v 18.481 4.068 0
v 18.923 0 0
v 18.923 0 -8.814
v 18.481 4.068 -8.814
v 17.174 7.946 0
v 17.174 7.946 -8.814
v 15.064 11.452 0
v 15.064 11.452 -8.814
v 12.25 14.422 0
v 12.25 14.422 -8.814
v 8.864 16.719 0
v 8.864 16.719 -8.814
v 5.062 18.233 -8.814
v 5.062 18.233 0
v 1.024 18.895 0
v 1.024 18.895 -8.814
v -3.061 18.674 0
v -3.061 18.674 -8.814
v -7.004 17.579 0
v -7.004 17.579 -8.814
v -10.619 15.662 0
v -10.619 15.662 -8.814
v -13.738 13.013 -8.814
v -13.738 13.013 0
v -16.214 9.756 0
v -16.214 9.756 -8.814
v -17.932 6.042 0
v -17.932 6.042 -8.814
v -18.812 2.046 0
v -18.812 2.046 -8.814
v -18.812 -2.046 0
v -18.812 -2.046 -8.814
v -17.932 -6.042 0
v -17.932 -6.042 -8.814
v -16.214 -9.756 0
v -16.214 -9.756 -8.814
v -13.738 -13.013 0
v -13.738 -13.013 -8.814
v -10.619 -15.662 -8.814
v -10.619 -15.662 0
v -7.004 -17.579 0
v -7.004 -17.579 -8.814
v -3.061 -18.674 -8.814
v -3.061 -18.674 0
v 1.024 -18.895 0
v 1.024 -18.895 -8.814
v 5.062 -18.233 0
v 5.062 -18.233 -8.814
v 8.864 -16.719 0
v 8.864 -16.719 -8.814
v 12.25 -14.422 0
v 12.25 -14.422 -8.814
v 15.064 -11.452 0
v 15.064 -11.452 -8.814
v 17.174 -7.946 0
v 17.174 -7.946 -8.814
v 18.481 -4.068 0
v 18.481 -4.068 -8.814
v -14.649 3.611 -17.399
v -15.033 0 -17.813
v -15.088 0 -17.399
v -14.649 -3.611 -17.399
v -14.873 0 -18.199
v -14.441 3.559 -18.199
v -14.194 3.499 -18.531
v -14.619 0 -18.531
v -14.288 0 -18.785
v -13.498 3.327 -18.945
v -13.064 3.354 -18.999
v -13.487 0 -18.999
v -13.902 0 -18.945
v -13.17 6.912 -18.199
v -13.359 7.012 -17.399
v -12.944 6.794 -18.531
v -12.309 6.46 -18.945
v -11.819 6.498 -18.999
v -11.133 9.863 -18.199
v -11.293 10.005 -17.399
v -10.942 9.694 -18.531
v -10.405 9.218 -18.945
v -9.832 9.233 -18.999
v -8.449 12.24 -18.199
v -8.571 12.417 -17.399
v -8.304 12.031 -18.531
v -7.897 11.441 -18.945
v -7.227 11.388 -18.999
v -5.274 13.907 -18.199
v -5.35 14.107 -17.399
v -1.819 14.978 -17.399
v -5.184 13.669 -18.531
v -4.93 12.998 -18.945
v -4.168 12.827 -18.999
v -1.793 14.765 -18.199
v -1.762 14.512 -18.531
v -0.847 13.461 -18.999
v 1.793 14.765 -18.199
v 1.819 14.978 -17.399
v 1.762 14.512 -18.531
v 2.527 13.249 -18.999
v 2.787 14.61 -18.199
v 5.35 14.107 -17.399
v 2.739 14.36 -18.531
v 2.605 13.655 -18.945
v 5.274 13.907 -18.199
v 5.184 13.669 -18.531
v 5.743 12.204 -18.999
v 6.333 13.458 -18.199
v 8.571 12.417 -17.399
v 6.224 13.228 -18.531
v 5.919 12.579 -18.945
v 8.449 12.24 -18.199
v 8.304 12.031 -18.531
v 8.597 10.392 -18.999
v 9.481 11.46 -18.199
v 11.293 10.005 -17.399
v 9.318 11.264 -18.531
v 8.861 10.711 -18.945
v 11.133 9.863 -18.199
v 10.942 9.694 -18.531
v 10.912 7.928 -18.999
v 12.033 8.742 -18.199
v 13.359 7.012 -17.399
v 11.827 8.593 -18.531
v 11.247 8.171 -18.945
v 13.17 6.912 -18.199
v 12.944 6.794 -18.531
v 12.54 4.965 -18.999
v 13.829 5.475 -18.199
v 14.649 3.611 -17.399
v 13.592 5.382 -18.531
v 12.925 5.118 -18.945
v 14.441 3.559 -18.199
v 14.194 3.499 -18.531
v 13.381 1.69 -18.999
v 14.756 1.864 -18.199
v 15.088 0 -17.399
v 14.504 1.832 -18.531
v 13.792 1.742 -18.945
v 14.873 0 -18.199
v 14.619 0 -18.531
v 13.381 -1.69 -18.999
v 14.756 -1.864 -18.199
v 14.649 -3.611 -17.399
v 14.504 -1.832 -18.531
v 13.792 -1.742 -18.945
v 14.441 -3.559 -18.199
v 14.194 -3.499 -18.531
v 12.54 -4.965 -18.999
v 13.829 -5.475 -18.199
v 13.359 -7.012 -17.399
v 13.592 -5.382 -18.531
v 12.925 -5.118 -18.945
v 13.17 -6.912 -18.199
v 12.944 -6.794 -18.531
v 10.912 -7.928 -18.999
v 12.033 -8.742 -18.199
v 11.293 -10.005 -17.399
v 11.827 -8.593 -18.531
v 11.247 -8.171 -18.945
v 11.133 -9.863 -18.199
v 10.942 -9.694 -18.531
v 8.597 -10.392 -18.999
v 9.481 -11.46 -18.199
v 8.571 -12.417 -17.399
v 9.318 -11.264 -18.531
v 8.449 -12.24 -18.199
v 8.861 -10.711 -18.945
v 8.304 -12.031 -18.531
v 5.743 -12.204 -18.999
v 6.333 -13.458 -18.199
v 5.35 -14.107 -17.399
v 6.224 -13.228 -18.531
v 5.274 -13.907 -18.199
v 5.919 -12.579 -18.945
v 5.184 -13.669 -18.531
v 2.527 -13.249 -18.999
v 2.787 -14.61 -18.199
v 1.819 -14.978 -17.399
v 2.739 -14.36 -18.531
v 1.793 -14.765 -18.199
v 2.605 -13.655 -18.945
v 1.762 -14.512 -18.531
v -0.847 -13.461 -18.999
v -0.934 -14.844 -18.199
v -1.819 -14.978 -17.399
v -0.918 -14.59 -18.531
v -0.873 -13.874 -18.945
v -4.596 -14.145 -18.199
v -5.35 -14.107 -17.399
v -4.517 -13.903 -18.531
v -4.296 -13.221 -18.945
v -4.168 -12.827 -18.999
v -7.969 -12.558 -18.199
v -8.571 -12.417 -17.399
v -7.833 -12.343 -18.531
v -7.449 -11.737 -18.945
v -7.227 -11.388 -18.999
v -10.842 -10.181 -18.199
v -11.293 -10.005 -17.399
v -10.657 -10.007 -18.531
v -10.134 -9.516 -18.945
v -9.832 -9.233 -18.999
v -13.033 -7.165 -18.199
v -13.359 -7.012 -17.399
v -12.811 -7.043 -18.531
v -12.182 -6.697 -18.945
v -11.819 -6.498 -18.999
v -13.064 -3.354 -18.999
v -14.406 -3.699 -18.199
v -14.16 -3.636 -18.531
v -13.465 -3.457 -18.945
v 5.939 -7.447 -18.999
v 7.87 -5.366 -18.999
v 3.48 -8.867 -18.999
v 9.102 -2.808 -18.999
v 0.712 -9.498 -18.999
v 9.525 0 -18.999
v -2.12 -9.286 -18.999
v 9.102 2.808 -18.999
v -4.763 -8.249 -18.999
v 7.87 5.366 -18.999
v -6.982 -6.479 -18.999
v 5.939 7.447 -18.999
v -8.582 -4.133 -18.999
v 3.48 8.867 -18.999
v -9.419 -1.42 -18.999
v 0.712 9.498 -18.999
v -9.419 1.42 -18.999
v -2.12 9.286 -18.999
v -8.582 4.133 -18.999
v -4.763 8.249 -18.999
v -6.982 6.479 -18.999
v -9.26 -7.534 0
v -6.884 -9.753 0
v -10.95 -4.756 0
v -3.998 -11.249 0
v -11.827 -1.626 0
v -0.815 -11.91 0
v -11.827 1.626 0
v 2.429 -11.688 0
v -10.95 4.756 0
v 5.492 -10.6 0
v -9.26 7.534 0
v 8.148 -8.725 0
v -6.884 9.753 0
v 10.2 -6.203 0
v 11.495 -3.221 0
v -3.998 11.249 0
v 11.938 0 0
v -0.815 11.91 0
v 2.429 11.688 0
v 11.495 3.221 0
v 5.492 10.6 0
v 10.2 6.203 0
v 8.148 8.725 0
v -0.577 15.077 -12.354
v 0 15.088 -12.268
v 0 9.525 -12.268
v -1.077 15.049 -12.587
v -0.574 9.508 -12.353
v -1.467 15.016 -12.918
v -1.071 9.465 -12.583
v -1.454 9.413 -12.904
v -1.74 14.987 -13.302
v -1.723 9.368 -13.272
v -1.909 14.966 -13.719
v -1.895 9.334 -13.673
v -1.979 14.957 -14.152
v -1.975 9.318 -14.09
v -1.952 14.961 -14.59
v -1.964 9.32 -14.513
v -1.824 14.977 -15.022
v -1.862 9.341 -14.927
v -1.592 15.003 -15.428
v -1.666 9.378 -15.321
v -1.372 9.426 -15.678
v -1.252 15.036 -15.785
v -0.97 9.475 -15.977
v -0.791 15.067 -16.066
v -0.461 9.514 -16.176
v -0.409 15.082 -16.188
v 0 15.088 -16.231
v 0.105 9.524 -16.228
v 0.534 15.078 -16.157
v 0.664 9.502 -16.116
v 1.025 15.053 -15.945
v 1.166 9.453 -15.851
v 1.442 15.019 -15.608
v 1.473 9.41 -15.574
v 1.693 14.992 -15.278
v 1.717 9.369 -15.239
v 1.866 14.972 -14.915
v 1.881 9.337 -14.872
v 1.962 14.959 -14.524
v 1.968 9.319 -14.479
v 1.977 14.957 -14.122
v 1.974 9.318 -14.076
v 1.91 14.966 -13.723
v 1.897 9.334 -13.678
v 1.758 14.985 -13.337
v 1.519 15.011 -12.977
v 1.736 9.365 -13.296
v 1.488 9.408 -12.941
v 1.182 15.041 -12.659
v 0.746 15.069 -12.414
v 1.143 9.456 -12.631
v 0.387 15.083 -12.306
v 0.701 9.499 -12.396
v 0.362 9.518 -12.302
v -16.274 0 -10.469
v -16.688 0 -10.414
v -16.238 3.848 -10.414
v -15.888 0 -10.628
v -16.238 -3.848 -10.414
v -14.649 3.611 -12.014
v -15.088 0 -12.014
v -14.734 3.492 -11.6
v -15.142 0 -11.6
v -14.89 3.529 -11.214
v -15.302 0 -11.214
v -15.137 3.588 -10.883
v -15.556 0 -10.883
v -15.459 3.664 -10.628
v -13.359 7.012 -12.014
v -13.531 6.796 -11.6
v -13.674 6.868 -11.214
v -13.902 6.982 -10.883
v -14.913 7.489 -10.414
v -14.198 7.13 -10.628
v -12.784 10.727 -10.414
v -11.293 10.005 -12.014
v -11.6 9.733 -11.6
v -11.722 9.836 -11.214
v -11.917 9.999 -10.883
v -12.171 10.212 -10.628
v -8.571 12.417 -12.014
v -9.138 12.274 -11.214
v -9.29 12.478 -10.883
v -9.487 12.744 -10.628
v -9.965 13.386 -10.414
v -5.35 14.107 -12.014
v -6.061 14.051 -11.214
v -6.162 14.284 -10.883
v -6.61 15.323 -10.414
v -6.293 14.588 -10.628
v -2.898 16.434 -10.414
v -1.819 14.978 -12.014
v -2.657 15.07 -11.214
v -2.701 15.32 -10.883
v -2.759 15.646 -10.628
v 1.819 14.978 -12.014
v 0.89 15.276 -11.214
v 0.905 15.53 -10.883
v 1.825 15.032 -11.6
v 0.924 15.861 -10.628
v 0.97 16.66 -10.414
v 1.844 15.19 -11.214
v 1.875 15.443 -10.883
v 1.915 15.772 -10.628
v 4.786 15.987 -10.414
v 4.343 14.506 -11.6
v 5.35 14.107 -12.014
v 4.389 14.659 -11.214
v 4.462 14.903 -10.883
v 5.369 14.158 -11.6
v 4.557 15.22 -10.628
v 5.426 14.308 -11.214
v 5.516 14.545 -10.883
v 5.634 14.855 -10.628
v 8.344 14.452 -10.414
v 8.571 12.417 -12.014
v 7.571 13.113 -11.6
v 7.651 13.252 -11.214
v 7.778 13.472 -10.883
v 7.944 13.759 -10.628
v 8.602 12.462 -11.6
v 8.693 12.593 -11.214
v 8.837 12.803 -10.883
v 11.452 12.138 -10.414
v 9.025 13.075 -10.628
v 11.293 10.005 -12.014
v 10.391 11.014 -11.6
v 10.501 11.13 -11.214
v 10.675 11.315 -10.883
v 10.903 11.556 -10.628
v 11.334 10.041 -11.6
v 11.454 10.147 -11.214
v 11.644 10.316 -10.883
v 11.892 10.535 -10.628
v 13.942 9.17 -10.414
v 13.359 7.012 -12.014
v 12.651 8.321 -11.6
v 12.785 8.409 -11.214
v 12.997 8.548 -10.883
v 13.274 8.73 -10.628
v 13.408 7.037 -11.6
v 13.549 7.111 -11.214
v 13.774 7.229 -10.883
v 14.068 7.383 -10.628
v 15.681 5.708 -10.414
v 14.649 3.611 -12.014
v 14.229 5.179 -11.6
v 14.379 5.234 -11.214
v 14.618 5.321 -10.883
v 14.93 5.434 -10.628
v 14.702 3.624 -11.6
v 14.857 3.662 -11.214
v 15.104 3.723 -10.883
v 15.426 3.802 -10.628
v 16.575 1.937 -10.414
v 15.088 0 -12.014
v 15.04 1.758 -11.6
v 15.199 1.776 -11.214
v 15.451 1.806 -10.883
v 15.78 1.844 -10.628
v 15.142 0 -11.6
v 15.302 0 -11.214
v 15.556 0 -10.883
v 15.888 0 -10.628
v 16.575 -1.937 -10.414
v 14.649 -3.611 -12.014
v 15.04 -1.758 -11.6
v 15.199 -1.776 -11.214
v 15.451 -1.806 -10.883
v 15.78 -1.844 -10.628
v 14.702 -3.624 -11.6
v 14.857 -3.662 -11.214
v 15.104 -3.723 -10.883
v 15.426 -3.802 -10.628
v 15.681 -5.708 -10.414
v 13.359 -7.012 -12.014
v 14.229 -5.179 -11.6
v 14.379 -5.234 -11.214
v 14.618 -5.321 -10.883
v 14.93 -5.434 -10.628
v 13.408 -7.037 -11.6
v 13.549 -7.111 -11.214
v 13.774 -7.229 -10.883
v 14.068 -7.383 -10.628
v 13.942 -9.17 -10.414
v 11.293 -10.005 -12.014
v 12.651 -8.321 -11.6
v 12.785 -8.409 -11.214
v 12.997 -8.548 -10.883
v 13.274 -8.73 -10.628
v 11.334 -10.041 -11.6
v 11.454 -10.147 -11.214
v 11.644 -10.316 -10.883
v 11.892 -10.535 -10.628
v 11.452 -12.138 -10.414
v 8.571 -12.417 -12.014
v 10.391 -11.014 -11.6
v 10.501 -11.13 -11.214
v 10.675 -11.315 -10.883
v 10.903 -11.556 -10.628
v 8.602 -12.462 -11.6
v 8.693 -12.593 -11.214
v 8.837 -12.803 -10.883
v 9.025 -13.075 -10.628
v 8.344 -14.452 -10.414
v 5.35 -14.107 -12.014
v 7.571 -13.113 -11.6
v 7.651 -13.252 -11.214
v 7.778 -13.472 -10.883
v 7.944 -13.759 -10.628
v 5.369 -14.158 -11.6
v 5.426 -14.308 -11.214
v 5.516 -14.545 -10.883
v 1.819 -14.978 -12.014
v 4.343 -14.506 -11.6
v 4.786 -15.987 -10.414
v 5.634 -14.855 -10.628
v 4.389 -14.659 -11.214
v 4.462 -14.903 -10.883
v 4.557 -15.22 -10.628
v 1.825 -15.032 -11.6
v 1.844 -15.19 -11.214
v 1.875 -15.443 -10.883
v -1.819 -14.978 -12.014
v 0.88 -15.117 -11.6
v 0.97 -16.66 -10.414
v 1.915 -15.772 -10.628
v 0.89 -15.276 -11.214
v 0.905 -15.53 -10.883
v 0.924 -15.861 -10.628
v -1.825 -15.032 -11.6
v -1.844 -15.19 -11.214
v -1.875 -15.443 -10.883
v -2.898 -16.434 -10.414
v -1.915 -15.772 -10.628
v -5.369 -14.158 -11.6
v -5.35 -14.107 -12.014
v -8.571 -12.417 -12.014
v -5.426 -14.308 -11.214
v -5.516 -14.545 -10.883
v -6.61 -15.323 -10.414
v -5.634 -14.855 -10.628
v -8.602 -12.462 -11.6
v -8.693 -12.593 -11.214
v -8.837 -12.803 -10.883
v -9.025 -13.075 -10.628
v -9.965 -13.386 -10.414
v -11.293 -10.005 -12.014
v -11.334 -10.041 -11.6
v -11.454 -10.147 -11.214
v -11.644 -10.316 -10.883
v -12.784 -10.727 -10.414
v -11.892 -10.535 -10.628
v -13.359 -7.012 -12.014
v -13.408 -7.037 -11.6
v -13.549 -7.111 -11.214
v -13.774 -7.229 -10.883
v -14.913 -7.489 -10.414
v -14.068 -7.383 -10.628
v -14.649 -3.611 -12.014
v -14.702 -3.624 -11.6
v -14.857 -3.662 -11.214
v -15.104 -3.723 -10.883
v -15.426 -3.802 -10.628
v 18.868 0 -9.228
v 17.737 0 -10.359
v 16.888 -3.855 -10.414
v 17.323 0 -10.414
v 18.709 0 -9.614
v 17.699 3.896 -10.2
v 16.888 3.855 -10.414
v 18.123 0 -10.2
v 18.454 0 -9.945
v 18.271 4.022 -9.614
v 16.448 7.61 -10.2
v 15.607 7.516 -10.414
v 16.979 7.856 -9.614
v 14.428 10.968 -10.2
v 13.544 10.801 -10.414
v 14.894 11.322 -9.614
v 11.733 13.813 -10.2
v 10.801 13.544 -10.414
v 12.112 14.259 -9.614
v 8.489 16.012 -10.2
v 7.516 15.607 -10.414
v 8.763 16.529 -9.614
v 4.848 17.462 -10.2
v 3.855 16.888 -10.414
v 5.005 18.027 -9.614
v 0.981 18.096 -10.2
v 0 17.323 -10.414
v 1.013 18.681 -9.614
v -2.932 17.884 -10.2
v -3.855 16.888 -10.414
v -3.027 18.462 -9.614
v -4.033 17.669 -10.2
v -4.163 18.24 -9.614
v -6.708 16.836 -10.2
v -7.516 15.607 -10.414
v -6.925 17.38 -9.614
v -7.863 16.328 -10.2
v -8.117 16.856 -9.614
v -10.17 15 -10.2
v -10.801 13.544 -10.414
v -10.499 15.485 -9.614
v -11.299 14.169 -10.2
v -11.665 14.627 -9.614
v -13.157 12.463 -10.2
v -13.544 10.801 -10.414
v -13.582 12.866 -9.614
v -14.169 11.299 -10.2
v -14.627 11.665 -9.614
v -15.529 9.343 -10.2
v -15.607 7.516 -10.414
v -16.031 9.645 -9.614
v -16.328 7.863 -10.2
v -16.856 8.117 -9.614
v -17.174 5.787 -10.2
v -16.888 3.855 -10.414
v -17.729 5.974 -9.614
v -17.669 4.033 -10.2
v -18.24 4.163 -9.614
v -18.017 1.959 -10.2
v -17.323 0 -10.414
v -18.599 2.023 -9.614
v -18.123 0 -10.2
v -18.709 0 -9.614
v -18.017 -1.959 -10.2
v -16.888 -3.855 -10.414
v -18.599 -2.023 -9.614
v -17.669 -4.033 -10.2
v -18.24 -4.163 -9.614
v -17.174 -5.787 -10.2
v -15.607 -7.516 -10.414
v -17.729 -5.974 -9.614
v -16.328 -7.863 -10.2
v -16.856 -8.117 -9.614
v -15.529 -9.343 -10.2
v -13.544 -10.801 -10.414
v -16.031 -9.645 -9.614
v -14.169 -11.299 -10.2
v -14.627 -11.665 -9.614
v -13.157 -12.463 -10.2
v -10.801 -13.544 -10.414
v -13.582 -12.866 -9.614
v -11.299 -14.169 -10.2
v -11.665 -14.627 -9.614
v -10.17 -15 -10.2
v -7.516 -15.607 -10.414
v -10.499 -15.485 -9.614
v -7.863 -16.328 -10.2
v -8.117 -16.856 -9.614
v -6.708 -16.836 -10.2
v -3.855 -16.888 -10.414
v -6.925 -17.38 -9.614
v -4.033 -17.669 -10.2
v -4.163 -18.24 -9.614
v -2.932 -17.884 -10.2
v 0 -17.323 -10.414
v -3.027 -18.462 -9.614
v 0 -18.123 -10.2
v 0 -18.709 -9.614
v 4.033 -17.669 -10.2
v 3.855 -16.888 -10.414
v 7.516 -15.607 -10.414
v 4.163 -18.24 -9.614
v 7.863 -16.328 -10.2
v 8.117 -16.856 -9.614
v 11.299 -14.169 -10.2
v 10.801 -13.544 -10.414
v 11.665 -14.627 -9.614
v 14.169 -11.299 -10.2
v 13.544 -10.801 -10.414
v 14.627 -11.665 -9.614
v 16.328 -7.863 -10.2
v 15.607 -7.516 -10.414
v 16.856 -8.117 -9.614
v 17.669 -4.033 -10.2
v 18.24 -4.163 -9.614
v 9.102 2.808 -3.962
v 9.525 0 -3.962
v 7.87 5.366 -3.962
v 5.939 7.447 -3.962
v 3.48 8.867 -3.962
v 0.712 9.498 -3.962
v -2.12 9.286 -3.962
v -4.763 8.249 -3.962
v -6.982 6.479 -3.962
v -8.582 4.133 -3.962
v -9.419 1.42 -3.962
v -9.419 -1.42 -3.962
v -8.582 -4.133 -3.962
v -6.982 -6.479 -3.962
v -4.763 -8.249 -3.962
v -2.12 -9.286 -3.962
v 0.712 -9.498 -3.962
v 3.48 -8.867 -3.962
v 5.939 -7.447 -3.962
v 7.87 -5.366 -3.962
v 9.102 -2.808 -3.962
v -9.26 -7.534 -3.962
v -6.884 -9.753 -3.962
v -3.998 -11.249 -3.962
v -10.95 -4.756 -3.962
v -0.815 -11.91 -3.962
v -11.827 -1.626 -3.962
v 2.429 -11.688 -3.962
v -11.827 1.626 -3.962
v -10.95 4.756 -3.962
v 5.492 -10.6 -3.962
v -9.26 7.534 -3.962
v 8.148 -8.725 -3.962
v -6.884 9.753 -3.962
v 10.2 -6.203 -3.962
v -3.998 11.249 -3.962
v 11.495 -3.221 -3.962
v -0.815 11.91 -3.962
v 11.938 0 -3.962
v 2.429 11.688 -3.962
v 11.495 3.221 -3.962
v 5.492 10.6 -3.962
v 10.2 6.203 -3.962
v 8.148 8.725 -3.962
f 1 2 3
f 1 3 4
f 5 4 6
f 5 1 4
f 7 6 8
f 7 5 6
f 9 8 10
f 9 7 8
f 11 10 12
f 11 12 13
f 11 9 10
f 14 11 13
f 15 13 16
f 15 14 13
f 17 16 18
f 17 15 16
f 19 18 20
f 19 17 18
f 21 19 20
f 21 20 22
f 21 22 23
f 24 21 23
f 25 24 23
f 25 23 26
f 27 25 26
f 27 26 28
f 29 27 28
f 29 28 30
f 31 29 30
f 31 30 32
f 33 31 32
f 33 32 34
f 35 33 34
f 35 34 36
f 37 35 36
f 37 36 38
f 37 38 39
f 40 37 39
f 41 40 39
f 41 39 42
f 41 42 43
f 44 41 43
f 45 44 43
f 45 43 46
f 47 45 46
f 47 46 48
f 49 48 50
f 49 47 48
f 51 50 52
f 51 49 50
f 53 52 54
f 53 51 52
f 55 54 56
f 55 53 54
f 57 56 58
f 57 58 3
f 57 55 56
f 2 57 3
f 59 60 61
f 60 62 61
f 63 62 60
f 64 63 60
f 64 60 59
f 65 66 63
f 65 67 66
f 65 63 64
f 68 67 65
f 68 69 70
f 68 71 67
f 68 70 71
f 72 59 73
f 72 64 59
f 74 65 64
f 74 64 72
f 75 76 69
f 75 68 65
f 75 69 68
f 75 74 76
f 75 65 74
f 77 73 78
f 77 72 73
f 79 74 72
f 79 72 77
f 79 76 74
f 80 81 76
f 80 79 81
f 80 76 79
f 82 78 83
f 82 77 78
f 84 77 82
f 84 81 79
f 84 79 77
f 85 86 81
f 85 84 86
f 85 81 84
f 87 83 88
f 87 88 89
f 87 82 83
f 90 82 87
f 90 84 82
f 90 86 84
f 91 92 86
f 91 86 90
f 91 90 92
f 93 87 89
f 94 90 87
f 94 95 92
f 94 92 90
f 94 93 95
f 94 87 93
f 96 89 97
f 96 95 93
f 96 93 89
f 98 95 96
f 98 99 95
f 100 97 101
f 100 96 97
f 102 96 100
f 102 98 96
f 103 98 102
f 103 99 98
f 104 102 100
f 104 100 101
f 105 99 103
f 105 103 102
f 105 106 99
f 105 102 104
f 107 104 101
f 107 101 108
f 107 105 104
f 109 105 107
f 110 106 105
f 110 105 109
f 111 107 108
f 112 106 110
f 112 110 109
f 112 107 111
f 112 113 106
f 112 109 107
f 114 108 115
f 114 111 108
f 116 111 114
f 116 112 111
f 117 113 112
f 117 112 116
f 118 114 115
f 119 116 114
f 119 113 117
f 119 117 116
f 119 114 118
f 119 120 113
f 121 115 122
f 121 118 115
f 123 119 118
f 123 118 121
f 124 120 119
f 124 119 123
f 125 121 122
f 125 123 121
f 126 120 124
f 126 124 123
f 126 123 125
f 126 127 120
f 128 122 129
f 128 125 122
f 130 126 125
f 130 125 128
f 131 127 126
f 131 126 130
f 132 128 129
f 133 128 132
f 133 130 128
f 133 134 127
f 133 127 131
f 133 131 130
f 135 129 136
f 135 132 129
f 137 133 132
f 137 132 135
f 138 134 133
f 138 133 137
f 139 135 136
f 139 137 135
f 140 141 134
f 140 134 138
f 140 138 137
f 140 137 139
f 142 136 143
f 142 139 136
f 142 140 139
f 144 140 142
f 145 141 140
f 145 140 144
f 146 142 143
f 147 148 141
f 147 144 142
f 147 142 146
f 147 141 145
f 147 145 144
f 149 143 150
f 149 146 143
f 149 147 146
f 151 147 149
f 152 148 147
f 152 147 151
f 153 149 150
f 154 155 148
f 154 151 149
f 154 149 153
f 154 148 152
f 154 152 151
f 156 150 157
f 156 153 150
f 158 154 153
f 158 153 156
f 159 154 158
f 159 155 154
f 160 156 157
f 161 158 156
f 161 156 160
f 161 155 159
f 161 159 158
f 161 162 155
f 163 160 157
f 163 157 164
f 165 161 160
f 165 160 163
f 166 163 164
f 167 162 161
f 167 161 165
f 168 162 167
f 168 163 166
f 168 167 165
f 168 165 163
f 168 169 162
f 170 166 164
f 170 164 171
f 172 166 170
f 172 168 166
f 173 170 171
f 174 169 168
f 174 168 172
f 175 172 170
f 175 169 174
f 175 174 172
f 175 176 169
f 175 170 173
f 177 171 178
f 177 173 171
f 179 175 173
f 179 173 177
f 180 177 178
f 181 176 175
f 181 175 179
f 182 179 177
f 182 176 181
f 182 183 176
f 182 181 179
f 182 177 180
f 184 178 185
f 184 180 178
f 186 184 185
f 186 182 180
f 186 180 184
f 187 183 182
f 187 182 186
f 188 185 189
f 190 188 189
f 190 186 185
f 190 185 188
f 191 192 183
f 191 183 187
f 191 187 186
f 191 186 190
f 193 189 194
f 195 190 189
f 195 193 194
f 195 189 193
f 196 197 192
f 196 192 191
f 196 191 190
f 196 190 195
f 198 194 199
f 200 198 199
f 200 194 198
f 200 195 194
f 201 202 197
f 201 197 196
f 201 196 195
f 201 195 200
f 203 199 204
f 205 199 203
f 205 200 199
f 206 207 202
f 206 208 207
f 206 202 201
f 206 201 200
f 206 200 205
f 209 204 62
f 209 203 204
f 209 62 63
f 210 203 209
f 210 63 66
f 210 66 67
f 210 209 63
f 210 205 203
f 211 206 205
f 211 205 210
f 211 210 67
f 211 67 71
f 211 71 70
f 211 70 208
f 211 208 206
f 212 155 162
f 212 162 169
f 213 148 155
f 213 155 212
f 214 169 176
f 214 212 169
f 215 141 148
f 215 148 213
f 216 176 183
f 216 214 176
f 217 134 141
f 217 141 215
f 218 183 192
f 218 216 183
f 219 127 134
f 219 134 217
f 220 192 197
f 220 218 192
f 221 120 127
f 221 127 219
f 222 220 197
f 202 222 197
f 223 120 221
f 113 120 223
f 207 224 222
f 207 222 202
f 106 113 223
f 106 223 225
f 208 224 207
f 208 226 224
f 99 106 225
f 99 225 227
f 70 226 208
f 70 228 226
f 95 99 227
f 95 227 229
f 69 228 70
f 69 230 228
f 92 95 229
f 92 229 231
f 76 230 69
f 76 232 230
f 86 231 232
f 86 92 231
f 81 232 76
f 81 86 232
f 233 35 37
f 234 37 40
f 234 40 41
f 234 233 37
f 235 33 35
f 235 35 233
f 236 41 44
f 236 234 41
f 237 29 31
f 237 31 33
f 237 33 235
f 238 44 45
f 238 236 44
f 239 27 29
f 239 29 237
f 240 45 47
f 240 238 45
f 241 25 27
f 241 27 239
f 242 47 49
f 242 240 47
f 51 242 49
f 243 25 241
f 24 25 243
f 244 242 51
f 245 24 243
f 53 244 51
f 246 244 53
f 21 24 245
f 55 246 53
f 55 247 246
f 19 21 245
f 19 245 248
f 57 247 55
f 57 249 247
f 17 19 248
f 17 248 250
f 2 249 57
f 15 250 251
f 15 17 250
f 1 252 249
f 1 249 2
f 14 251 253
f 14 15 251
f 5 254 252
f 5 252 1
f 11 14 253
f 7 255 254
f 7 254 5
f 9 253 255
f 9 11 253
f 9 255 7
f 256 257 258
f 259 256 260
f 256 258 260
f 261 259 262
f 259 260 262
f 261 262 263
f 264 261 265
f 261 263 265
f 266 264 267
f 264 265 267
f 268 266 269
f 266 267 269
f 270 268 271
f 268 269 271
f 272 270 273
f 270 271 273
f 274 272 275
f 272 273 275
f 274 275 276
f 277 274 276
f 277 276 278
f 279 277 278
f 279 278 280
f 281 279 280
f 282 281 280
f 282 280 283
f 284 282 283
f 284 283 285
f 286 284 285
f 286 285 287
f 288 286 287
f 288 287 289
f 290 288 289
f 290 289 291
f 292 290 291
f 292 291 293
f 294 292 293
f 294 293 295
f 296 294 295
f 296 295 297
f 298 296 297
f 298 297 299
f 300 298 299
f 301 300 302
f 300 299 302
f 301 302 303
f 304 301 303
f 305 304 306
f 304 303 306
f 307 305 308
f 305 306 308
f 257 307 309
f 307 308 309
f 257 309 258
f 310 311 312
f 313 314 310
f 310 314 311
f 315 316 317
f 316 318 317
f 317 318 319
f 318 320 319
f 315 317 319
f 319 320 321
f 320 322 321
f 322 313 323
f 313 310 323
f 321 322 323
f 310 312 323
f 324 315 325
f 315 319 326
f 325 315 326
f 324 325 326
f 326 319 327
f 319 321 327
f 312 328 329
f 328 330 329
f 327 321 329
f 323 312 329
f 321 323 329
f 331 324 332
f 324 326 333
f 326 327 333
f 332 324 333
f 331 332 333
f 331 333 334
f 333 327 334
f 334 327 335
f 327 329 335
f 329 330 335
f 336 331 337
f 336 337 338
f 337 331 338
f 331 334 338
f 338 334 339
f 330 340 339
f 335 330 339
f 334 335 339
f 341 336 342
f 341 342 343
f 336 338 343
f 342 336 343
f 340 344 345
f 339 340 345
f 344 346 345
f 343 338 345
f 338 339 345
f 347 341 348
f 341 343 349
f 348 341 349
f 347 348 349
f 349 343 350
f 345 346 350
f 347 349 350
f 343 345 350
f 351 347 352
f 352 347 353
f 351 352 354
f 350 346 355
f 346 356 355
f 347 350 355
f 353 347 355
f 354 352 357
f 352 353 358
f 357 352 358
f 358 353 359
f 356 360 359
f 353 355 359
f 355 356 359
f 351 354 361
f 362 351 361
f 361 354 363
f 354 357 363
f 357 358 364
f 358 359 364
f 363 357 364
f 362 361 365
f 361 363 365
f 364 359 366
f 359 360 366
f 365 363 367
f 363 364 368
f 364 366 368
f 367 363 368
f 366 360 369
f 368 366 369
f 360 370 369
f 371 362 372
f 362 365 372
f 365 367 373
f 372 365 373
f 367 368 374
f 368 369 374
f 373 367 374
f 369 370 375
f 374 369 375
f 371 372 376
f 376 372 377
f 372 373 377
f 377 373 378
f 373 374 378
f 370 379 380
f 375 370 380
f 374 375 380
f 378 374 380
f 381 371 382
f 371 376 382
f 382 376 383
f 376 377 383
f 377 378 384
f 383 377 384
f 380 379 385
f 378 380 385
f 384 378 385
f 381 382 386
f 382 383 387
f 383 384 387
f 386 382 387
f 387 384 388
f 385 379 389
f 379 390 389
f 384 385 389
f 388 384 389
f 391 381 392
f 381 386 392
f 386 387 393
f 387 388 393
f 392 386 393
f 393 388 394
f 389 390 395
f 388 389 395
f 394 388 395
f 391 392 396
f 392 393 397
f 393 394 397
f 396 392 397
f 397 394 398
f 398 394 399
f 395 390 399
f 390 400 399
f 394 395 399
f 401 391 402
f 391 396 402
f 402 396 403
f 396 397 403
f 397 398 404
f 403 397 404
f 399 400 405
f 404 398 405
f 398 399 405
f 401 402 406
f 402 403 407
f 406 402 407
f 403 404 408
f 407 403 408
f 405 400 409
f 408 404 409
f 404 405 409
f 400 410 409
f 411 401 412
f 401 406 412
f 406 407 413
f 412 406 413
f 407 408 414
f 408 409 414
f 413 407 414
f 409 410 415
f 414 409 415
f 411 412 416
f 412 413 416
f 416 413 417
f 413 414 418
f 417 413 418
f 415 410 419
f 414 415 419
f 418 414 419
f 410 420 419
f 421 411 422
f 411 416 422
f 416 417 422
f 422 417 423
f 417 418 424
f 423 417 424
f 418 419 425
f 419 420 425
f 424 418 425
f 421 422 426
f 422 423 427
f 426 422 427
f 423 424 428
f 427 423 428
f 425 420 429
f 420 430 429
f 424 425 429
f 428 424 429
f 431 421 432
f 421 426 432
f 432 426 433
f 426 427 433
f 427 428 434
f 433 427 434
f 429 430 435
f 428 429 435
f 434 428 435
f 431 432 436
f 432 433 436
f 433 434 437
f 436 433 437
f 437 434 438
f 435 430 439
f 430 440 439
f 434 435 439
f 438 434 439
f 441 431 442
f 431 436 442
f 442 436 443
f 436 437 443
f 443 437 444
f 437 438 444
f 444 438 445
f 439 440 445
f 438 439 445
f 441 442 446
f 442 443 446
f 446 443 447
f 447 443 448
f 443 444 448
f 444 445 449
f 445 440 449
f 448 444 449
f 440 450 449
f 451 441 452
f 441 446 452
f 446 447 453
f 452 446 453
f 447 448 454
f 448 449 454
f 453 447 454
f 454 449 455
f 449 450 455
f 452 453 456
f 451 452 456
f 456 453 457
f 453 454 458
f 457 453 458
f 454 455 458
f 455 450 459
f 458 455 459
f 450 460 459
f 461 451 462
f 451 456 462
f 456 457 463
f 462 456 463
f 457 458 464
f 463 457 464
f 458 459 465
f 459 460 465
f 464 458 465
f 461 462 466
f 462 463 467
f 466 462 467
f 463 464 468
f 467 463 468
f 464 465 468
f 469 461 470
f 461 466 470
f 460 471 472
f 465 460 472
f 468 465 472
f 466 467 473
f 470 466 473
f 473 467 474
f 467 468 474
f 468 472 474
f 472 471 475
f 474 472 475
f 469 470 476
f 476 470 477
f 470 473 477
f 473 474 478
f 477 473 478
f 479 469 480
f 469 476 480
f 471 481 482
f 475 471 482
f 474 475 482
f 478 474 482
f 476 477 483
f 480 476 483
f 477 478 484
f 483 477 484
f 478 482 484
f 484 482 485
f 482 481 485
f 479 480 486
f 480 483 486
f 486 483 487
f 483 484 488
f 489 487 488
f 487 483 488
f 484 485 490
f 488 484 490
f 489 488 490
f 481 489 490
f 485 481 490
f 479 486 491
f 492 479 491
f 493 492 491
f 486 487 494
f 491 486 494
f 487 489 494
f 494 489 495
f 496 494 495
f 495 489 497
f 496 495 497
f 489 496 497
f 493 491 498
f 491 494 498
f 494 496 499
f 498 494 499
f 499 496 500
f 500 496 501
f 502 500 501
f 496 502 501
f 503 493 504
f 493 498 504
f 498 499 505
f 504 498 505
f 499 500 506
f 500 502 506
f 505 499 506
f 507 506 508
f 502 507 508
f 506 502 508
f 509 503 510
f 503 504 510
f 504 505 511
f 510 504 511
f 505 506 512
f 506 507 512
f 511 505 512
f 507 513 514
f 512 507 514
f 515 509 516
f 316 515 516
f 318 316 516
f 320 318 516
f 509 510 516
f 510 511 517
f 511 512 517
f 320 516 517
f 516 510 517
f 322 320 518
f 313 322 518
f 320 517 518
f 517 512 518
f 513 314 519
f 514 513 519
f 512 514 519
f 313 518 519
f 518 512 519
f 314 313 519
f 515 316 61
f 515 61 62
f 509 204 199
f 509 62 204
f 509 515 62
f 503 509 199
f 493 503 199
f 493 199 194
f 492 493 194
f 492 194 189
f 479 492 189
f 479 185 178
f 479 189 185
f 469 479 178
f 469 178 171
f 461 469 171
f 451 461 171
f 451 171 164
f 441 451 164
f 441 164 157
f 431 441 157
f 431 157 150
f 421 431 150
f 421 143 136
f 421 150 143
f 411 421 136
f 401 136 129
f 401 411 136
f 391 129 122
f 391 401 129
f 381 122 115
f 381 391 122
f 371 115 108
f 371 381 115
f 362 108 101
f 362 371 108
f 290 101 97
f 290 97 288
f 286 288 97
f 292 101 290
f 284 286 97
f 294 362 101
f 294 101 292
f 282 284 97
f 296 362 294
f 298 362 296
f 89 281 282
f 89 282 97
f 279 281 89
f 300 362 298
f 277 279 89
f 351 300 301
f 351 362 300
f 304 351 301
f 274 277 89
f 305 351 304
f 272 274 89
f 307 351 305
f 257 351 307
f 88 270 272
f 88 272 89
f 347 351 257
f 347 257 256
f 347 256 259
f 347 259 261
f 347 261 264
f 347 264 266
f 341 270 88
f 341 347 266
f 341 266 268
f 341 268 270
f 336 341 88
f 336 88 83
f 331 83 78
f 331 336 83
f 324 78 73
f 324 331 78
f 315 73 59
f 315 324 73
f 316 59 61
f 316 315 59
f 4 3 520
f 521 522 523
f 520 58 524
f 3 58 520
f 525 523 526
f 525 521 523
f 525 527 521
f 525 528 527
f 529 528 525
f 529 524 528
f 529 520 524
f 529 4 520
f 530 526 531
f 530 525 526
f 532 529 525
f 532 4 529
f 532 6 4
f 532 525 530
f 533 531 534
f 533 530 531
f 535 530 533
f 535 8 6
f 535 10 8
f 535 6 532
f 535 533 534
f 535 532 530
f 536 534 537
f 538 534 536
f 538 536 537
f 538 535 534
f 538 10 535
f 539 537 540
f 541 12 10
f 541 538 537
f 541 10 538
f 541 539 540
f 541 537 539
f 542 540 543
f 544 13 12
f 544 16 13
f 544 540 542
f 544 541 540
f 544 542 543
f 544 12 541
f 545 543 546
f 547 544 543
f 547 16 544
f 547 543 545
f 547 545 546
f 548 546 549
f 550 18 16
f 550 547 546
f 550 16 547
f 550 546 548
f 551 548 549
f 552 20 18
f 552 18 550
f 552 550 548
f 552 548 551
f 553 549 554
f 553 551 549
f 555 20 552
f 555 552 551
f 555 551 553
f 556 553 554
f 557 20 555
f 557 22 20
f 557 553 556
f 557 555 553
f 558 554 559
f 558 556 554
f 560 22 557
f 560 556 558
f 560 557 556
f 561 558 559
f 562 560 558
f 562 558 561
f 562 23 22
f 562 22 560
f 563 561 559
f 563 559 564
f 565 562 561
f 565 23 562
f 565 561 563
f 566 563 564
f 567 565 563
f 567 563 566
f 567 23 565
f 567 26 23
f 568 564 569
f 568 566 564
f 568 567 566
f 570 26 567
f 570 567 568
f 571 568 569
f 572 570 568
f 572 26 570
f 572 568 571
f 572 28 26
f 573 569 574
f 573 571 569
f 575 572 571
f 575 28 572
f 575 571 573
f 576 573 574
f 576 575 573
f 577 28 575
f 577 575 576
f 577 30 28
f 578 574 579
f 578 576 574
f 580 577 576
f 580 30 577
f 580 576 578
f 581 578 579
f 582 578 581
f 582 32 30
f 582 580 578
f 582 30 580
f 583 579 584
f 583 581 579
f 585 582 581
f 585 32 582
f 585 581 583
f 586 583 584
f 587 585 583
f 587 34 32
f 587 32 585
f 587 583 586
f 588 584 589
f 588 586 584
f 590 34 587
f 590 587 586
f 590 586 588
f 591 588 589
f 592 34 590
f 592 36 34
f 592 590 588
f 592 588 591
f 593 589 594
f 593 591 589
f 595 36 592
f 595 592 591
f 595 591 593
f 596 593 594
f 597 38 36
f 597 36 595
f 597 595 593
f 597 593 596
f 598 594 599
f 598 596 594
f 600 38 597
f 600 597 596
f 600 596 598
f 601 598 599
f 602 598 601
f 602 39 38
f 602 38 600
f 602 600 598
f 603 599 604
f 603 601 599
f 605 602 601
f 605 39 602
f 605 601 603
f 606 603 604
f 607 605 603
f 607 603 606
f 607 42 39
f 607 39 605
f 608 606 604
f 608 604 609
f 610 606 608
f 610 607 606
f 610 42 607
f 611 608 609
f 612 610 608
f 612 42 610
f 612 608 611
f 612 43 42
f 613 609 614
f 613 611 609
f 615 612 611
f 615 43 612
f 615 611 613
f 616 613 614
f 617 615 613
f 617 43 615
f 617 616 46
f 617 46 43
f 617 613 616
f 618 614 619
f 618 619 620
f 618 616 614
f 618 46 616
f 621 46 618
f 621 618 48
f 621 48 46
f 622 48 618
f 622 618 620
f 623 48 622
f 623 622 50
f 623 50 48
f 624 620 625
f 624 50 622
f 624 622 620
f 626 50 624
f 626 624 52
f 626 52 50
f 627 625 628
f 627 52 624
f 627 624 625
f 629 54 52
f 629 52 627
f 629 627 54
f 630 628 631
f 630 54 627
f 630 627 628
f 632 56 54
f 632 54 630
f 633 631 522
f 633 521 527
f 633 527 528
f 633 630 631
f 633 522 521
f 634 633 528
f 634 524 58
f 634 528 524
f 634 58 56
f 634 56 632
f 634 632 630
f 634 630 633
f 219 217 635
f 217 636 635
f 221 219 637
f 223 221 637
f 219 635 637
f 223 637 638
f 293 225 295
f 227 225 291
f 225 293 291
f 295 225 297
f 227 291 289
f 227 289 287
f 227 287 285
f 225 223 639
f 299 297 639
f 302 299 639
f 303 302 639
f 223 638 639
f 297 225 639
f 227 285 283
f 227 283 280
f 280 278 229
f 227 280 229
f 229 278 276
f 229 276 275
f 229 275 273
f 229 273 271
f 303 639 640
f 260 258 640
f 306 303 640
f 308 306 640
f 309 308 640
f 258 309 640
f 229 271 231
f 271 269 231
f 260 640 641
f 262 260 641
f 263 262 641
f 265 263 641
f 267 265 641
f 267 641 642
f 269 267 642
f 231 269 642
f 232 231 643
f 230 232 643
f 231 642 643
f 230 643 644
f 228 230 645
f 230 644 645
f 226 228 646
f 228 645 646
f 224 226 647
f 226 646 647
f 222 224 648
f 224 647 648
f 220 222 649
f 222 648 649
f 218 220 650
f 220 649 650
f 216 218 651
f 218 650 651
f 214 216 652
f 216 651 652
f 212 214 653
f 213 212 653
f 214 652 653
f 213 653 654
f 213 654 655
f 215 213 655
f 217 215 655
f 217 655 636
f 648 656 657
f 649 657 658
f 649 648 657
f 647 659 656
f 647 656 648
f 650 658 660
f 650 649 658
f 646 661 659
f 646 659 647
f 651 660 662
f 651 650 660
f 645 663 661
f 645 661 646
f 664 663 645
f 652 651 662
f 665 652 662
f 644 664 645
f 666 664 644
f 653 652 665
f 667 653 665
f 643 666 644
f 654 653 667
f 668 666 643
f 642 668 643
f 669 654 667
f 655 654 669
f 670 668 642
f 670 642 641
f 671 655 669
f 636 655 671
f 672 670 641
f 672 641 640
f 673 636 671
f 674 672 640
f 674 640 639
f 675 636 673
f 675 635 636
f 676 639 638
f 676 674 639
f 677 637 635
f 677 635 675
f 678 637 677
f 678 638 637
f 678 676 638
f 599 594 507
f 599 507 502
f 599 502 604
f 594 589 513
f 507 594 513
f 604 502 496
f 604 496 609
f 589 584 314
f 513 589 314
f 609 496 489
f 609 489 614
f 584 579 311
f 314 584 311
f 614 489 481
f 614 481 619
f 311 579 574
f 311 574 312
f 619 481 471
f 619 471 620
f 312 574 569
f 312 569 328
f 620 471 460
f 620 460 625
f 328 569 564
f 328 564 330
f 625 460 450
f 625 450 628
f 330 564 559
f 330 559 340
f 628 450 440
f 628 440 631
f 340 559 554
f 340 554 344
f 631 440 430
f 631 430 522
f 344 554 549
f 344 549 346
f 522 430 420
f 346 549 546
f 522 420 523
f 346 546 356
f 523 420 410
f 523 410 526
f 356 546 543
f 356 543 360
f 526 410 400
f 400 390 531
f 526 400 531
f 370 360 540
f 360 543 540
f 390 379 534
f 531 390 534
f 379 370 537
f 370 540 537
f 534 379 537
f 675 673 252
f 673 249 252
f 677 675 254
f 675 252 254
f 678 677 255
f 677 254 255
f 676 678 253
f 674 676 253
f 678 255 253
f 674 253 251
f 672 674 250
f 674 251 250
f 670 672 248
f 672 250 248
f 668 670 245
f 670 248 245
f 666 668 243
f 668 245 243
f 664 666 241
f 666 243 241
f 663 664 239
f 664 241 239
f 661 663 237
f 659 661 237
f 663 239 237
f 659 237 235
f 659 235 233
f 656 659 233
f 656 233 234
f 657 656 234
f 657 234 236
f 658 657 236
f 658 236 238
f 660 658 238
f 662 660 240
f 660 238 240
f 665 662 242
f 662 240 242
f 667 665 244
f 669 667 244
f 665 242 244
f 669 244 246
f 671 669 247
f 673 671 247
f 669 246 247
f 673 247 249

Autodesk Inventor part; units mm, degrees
ref_plane "YZ Plane" through (0, 0, 0) normal (1, 0, 0) x (0, 1, 0)
ref_plane "XZ Plane" through (0, 0, 0) normal (0, 1, 0) x (-1, 0, 0)
sketch "Sketch4" plane through (0, 0, 0) normal (0, 0, 1) x (1, 0, 0)
  circle A0 centre (0, 0) radius 18.923
  dimension "d2" = 37.846
extrude "Extrusion1" add sketch "Sketch4" against normal blind 10.414
sketch "Sketch7" plane through (0, 0, 0) normal (0, 0, 1) x (1, 0, 0)
  circle A0 centre (0, 0) radius 9.525
  dimension "d8" = 19.05
extrude "Extrusion3" cut sketch "Sketch7" against normal blind 127
sketch "Sketch8" plane through (0, 0, 0) normal (0, 0, 1) x (1, 0, 0)
  circle A0 centre (0, 0) radius 11.938
  dimension "d11" = 23.876
extrude "Extrusion4" cut sketch "Sketch8" against normal blind 3.9624
sketch "Sketch9" plane through (0, 0, -10.414) normal (0, 0, -1) x (-1, 0, 0)
  circle A0 centre (0, 0) radius 15.0876
  dimension "d14" = 30.1752
extrude "Extrusion5" add sketch "Sketch9" along normal blind 8.5852
sketch "Sketch10" plane through (0, 0, -10.414) normal (0, 0, 1) x (1, 0, 0)
  circle A0 centre (0, 0) radius 9.525
extrude "Extrusion6" cut sketch "Sketch10" against normal blind 8.5852
fillet "Fillet1" radius 1.6002 1 edges at (15.0876, 0, -10.414)
fillet "Fillet2" radius 1.6002 1 edges at (-18.923, 0, -10.414)
sketch "Sketch11" plane through (0, 0, -18.9992) normal (0, 0, -1) x (-1, 0, 0)
  circle A0 centre (0, 0) radius 9.525 projected
  line L0 (0, 9.525) -> (0, 15.0876)
  circle A1 centre (0, 0) radius 15.0876 projected
ref_plane "Work Plane2" through (0, 15.0876, -10.414) normal (0, 1, 0) x (-1, 0, 0)
sketch "Sketch12" plane through (0, 15.0876, -10.414) normal (0, 1, 0) x (-1, 0, 0)
  line L0 (0, 10.414) -> (0, -3.8354)
  dimension "d21" = 14.2494
hole "Hole1" at (0, 15.0876, -14.2494) direction (0, -1, 0) diameter 3.9624 depth 7.2644 thread size "10-32 UNF" class "2B" standard "ANSI Unified Screw Threads"
fillet "Fillet3" radius 1.6002 1 edges at (15.0876, 0, -18.9992)
properties part number "Problem14_15_JacobMorgan_031015_pd3" material "Bronze"
